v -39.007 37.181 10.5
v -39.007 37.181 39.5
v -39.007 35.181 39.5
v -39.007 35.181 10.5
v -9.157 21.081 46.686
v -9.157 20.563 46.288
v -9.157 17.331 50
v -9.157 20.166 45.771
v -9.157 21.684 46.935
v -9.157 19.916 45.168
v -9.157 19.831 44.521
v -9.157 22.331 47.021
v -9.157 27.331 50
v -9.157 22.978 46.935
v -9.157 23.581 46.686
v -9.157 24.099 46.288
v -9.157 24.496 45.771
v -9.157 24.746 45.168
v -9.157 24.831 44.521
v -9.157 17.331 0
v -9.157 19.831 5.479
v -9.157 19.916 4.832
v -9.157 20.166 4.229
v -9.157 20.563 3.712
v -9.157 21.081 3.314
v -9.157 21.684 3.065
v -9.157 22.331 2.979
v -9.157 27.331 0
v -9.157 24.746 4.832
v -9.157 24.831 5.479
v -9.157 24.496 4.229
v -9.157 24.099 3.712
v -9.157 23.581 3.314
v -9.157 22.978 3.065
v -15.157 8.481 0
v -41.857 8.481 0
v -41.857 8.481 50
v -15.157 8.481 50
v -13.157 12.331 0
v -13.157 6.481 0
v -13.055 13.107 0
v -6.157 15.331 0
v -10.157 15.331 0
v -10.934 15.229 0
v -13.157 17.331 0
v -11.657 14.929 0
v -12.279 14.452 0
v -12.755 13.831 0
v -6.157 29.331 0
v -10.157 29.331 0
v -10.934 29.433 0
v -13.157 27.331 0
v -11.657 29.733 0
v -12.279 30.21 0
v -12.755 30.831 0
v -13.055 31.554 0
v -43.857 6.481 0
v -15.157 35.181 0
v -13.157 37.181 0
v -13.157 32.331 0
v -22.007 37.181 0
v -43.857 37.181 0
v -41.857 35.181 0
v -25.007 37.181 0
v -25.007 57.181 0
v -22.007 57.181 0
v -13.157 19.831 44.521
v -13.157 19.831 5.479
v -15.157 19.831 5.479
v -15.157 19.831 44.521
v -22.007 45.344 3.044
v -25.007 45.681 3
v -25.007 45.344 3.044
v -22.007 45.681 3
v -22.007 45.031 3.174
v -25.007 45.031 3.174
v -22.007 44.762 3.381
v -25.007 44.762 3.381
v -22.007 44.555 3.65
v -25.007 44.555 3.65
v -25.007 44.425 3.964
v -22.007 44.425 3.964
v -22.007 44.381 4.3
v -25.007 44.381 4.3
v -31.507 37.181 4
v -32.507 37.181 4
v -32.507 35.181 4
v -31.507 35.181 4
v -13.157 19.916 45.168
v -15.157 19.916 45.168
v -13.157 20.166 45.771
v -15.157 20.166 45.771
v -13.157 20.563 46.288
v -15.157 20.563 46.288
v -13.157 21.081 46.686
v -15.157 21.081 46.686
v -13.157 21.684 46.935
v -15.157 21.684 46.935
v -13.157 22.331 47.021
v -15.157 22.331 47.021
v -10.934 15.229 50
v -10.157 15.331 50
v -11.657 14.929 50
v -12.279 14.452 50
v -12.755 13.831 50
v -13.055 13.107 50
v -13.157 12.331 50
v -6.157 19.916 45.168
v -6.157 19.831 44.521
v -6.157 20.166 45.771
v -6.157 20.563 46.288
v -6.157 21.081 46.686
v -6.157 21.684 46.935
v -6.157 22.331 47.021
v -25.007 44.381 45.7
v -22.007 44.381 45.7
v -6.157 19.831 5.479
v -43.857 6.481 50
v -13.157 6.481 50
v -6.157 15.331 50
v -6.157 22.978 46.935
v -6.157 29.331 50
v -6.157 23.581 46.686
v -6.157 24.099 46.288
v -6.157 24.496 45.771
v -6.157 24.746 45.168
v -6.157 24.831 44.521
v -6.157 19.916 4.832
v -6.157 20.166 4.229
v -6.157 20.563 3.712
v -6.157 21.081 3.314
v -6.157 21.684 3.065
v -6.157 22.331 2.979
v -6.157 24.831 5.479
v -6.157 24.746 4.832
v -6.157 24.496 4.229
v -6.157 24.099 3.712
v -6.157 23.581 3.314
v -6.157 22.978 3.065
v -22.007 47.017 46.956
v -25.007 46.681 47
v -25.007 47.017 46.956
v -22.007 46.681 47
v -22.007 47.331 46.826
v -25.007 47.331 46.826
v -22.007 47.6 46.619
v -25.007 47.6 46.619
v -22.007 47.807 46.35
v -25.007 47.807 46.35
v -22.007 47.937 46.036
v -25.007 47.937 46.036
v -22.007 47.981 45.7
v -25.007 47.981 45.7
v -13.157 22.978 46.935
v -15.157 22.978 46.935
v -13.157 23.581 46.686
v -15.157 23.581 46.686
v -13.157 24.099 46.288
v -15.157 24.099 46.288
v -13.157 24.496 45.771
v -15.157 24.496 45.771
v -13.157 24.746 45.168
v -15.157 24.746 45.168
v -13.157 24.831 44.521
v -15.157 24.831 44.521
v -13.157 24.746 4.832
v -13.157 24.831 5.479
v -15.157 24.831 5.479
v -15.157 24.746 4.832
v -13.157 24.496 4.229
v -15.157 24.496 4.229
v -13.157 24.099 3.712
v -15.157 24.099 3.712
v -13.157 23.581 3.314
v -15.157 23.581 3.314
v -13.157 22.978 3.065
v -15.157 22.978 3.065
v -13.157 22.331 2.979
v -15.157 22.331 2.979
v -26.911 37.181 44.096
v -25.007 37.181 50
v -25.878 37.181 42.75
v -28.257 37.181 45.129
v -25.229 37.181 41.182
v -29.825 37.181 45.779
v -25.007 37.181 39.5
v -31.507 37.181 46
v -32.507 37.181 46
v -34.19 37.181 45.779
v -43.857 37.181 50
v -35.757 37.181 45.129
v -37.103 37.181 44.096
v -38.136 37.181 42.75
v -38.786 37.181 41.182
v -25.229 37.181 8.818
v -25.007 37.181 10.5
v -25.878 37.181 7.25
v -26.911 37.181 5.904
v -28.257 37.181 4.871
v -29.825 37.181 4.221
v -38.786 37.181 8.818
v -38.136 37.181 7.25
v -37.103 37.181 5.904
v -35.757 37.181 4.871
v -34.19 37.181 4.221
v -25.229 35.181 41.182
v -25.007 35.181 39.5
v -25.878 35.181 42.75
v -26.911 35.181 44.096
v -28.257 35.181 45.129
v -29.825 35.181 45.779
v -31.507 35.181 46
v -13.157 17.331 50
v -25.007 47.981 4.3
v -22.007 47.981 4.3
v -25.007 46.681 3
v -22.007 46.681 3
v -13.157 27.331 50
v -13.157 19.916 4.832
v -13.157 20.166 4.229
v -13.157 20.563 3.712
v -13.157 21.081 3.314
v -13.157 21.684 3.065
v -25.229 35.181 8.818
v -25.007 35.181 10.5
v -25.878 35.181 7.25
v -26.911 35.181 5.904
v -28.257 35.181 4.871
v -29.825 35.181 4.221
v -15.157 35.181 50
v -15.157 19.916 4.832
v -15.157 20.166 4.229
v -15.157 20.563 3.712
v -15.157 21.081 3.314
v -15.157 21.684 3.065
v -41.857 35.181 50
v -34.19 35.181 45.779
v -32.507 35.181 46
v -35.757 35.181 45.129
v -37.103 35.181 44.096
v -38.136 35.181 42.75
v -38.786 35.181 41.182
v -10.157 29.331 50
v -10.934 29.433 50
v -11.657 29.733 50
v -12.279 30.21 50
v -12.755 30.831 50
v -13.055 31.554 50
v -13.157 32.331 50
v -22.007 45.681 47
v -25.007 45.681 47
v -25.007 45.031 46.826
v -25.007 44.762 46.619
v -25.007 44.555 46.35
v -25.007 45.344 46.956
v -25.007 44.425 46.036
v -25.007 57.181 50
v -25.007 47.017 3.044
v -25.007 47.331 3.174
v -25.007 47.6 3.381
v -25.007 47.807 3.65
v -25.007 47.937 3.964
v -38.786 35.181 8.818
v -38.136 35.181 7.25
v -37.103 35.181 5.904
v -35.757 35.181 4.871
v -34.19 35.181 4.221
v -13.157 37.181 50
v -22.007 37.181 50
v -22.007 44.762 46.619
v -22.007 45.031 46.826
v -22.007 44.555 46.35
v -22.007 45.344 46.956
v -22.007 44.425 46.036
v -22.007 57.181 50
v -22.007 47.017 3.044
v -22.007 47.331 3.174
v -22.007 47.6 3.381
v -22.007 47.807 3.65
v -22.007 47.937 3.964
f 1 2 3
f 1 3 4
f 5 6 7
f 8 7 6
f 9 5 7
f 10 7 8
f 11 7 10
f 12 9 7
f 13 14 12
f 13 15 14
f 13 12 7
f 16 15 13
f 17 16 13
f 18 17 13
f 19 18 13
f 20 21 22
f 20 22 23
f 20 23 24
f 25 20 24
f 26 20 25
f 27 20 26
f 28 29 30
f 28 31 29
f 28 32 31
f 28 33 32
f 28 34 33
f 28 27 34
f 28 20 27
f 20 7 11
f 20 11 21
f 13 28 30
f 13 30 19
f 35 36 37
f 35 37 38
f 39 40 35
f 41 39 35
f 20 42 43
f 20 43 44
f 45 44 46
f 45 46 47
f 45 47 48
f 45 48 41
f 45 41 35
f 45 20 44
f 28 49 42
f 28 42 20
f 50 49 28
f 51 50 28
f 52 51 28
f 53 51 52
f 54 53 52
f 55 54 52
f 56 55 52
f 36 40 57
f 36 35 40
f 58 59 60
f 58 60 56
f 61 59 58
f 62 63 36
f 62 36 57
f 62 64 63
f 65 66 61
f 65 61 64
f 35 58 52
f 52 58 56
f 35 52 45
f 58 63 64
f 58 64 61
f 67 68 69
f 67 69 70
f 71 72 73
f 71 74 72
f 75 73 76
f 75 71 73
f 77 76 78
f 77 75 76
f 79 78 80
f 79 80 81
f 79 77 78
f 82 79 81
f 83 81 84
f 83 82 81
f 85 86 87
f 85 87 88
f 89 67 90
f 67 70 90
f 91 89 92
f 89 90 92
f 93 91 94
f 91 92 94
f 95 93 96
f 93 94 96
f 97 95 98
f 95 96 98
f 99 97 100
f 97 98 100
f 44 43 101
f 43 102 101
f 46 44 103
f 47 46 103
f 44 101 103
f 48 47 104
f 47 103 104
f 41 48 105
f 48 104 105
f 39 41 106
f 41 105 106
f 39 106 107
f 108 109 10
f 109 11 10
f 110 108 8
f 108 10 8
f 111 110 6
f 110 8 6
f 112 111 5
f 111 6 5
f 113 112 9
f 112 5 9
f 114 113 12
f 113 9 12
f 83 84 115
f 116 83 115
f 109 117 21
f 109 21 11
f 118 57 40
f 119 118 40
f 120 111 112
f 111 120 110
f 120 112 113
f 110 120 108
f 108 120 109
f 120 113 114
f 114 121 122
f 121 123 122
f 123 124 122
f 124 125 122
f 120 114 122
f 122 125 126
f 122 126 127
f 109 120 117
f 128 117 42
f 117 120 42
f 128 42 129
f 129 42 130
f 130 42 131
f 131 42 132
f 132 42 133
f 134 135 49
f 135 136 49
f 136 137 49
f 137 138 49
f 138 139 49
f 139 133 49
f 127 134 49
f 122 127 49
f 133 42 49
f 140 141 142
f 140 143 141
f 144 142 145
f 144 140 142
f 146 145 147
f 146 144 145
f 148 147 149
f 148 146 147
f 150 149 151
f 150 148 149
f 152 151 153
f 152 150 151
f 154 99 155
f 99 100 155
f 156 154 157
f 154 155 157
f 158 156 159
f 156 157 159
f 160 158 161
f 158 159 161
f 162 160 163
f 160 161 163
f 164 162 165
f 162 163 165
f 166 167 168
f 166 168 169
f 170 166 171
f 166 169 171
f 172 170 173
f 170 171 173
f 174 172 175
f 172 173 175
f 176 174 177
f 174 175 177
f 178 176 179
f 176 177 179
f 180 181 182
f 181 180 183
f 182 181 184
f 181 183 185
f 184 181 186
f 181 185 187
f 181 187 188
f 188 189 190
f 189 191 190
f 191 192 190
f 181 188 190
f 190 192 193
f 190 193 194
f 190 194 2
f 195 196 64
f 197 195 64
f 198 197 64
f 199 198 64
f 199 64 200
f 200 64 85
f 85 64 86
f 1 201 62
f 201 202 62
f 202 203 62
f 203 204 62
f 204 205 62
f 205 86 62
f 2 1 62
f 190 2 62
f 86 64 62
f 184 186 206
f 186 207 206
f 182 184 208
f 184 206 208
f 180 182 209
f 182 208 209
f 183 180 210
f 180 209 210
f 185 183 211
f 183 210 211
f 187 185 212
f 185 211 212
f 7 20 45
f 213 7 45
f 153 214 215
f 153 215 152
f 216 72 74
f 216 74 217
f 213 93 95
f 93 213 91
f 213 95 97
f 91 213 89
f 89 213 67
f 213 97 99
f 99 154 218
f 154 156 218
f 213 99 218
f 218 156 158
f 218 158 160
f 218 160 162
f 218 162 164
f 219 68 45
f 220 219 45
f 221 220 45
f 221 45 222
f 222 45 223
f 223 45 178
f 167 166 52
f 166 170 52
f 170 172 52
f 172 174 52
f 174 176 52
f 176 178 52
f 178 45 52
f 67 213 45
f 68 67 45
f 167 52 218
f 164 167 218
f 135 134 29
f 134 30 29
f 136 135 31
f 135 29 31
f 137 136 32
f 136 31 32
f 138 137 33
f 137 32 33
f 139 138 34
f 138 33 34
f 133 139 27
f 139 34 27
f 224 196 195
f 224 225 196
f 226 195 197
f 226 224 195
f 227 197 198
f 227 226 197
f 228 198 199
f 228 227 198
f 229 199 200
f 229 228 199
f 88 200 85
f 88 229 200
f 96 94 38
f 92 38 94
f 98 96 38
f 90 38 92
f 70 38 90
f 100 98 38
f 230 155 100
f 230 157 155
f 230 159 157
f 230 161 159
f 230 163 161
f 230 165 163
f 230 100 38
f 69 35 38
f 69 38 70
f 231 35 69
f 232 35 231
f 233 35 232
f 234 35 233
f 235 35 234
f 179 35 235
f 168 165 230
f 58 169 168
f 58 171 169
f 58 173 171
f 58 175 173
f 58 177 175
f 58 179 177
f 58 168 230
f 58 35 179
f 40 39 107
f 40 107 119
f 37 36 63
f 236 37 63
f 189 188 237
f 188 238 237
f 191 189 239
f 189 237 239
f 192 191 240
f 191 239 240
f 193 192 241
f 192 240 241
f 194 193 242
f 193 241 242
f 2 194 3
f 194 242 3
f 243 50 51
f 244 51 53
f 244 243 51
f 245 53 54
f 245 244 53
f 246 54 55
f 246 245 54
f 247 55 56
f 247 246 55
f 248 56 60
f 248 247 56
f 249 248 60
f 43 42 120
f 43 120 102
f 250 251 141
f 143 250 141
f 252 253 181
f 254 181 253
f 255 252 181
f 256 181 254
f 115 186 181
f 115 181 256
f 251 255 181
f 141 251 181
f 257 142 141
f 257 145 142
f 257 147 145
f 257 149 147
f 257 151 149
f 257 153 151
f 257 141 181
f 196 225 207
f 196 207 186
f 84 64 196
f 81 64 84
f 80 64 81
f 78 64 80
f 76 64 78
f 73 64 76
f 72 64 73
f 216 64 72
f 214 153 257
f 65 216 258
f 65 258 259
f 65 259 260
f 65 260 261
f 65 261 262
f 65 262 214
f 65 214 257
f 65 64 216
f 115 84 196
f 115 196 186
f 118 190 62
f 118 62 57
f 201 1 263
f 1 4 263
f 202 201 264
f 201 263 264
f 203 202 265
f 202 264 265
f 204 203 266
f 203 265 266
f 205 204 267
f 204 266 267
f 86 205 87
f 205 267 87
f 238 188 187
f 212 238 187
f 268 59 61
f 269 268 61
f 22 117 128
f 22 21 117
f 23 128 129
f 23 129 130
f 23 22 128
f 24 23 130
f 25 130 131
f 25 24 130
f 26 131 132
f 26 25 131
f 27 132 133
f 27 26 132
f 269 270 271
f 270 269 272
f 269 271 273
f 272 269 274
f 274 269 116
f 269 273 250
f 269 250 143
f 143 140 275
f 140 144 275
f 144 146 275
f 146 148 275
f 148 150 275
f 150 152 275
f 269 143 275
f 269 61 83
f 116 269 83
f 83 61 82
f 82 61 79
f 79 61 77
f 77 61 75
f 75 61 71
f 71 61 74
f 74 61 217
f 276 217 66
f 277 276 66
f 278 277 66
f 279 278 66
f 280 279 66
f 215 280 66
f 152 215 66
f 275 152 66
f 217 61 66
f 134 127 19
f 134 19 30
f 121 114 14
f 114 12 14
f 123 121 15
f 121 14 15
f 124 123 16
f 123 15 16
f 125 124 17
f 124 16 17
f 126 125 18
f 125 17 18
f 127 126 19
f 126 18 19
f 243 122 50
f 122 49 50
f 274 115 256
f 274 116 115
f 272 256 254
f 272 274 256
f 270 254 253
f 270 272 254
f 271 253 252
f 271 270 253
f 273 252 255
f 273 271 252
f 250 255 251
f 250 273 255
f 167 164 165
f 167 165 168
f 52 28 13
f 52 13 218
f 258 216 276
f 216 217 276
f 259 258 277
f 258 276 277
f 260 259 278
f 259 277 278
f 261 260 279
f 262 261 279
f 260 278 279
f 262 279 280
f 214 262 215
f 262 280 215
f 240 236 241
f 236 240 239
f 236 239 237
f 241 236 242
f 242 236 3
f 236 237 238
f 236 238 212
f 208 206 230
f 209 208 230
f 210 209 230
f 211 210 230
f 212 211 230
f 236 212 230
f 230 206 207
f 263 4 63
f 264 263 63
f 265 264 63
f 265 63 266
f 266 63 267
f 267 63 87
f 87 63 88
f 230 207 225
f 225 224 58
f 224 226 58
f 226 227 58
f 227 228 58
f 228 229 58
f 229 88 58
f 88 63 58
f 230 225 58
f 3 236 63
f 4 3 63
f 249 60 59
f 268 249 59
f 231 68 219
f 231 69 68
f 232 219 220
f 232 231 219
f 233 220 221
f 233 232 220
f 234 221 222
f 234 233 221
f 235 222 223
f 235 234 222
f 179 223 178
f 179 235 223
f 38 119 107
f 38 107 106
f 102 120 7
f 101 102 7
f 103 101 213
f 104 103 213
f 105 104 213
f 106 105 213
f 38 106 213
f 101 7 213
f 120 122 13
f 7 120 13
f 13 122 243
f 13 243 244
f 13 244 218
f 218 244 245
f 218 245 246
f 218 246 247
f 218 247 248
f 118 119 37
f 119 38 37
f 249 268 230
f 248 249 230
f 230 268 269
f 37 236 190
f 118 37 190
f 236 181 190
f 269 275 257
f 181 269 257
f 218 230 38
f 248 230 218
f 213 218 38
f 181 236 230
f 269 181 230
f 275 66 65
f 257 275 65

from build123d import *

# Parameters (mm, degrees)
CROQUIS3_W              = 26.7
CROQUIS3_H              = 26.7
CROQUIS3_W_2            = 4
CROQUIS3_H_2            = 25.7
SALIENTE_EXTRUIR1_DEPTH = 50
CORTAR_EXTRUIR14_REACH  = 74.827
REDONDEO2_R             = 2.5
CORTAR_EXTRUIR19_REACH  = 75.253
CROQUIS18_W             = 7
CROQUIS18_H             = 42
CROQUIS19_W             = 4
CROQUIS19_H             = 2
CROQUIS19_W_2           = 3
CROQUIS19_H_2           = 20
SALIENTE_EXTRUIR3_DEPTH = 50
CORTAR_EXTRUIR20_REACH  = 80.262
CROQUIS20_W             = 44
CROQUIS20_H             = 3.6
CORTAR_EXTRUIR21_REACH  = 89.71
REDONDEO6_R             = 3
REDONDEO9_R             = 1.3
CORTAR_EXTRUIR22_REACH  = 75.253
CROQUIS22_W             = 7
CROQUIS22_H             = 42
REDONDEO10_R            = 6.5


with BuildPart() as part:
    # Croquis3 → Saliente-Extruir1 (new body)
    with BuildSketch(Plane.XY):
        Polygon((-43.857247249, 6.480922369), (-6.157247249, 6.480922369), (-6.157247249, 37.180922369), (-27.007247249, 37.180922369), (-43.857247249, 37.180922369), align=None)
        with Locations((-28.507247249, 21.830922369)):
            Rectangle(CROQUIS3_W, CROQUIS3_H, mode=Mode.SUBTRACT)
        with Locations((-11.157247249, 22.330922369)):
            Rectangle(CROQUIS3_W_2, CROQUIS3_H_2, mode=Mode.SUBTRACT)
    extrude(amount=SALIENTE_EXTRUIR1_DEPTH)

    # Cortar-Extruir14: up to this face of the body (flat: up to its plane)
    cortar_extruir14_end = Plane(part.part.faces().sort_by_distance((-15.157247249, 21.830922369, 25))[0])
    # Croquis14 → Cortar-Extruir14 (cut, up to the picked face)
    with BuildSketch(Plane(origin=(-6.157247249, 0, 0), x_dir=(0, 0, -1), z_dir=(1, 0, 0)), mode=Mode.PRIVATE) as cortar_extruir14_sk1:
        Polygon((-2.979356026, 22.330922369), (-2.979356026, 19.830922369), (-47.020643974, 19.830922369), (-47.020643974, 22.330922369), (-47.020643974, 24.830922369), (-2.979356026, 24.830922369), align=None)
    cortar_extruir14_tool1 = split(extrude(cortar_extruir14_sk1.sketch, amount=-CORTAR_EXTRUIR14_REACH, mode=Mode.PRIVATE), bisect_by=cortar_extruir14_end, keep=Keep.BOTH, mode=Mode.PRIVATE)
    add(cortar_extruir14_tool1.solids().sort_by(Axis((-6.157247, 22.330922, 25), (-1, 0, 0)))[0], mode=Mode.SUBTRACT)

    # Redondeo2
    redondeo2_edges = [part.edges().sort_by_distance(p)[0] for p in [
        (-14.157247249, 24.830922369, 2.979356026),
        (-7.657247249, 24.830922369, 2.979356026),
        (-7.657247249, 19.830922369, 2.979356026),
        (-14.157247249, 19.830922369, 2.979356026),
        (-14.157247249, 24.830922369, 47.020643974),
        (-7.657247249, 24.830922369, 47.020643974),
        (-7.657247249, 19.830922369, 47.020643974),
        (-14.157247249, 19.830922369, 47.020643974),
    ]]
    fillet(redondeo2_edges, radius=REDONDEO2_R - 0.0001)  # a hair under: the kernel refuses the full size

    # Croquis18 → Cortar-Extruir19 (cut, up to next)
    with BuildSketch(Plane(origin=(0, 37.180922369, 0), x_dir=(1, 0, 0), z_dir=(0, 1, 0)), mode=Mode.PRIVATE) as cortar_extruir19_sk1:
        with Locations((-28.507247249, -25)):
            Rectangle(CROQUIS18_W, CROQUIS18_H)
    cortar_extruir19_tool1 = extrude(cortar_extruir19_sk1.sketch, amount=-CORTAR_EXTRUIR19_REACH, mode=Mode.PRIVATE) & part.part
    add(cortar_extruir19_tool1.solids().sort_by_distance((-28.507247, 37.180922, 25))[0], mode=Mode.SUBTRACT)

    # Croquis19 → Saliente-Extruir3 (add)
    with BuildSketch(Plane(origin=(0, 0, 0), x_dir=(-1, 0, 0), z_dir=(0, 0, -1))):
        with Locations((11.157247249, 16.330922369)):
            Rectangle(CROQUIS19_W, CROQUIS19_H)
        with Locations((11.157247249, 28.330922369)):
            Rectangle(CROQUIS19_W, CROQUIS19_H)
        with Locations((23.507247249, 47.180922369)):
            Rectangle(CROQUIS19_W_2, CROQUIS19_H_2)
    extrude(amount=-SALIENTE_EXTRUIR3_DEPTH)

    # Croquis20 → Cortar-Extruir20 (cut, up to next)
    with BuildSketch(Plane.ZY.offset(25.007247249), mode=Mode.PRIVATE) as cortar_extruir20_sk1:
        with Locations((25, 46.180922369)):
            Rectangle(CROQUIS20_W, CROQUIS20_H)
    cortar_extruir20_tool1 = extrude(cortar_extruir20_sk1.sketch, amount=-CORTAR_EXTRUIR20_REACH, mode=Mode.PRIVATE) & part.part
    add(cortar_extruir20_tool1.solids().sort_by_distance((-25.007247, 46.180922, 25))[0], mode=Mode.SUBTRACT)

    # Croquis21 → Cortar-Extruir21 (cut, up to next)
    with BuildSketch(Plane(origin=(0, 0, 0), x_dir=(-1, 0, 0), z_dir=(0, 0, -1)), mode=Mode.PRIVATE) as cortar_extruir21_sk1:
        Polygon((13.157247249, 35.180922369), (13.157247249, 37.180922369), (6.157247249, 37.180922369), (6.157247249, 29.330922369), (9.157247249, 29.330922369), (9.157247249, 35.180922369), align=None)
    cortar_extruir21_tool1 = extrude(cortar_extruir21_sk1.sketch, amount=-CORTAR_EXTRUIR21_REACH, mode=Mode.PRIVATE) & part.part
    # Croquis21 → Cortar-Extruir21 (cut, up to next)
    with BuildSketch(Plane(origin=(0, 0, 0), x_dir=(-1, 0, 0), z_dir=(0, 0, -1)), mode=Mode.PRIVATE) as cortar_extruir21_sk2:
        Polygon((6.157247249, 9.480922369), (6.157247249, 15.330922369), (9.157247249, 15.330922369), (9.157247249, 9.480922369), (13.157247249, 9.480922369), (13.157247249, 6.480922369), (6.157247249, 6.480922369), align=None)
    cortar_extruir21_tool2 = extrude(cortar_extruir21_sk2.sketch, amount=-CORTAR_EXTRUIR21_REACH, mode=Mode.PRIVATE) & part.part
    add(cortar_extruir21_tool1.solids().sort_by_distance((-8.544727, 33.997602, 0))[0], mode=Mode.SUBTRACT)
    add(cortar_extruir21_tool2.solids().sort_by_distance((-8.746741, 9.995417, 0))[0], mode=Mode.SUBTRACT)

    # Redondeo6
    redondeo6_edges = [part.edges().sort_by_distance(p)[0] for p in [
        (-13.157247249, 15.330922369, 25),
        (-13.157247249, 29.330922369, 25),
    ]]
    fillet(redondeo6_edges, radius=REDONDEO6_R)

    # Redondeo9
    redondeo9_edges = [part.edges().sort_by_distance(p)[0] for p in [
        (-23.507247249, 47.980922369, 3),
        (-23.507247249, 47.980922369, 47),
        (-23.507247249, 44.380922369, 47),
        (-23.507247249, 44.380922369, 3),
    ]]
    fillet(redondeo9_edges, radius=REDONDEO9_R)

    # Croquis22 → Cortar-Extruir22 (cut, up to next)
    with BuildSketch(Plane(origin=(0, 37.180922369, 0), x_dir=(1, 0, 0), z_dir=(0, 1, 0)), mode=Mode.PRIVATE) as cortar_extruir22_sk1:
        with Locations((-35.507247249, -25)):
            Rectangle(CROQUIS22_W, CROQUIS22_H)
    cortar_extruir22_tool1 = extrude(cortar_extruir22_sk1.sketch, amount=-CORTAR_EXTRUIR22_REACH, mode=Mode.PRIVATE) & part.part
    add(cortar_extruir22_tool1.solids().sort_by_distance((-35.507247, 37.180922, 25))[0], mode=Mode.SUBTRACT)

    # Redondeo10
    redondeo10_edges = [part.edges().sort_by_distance(p)[0] for p in [
        (-25.007247249, 36.180922369, 46),
        (-25.007247249, 36.180922369, 4),
        (-39.007247249, 36.180922369, 4),
        (-39.007247249, 36.180922369, 46),
    ]]
    fillet(redondeo10_edges, radius=REDONDEO10_R)


solid = part.part
